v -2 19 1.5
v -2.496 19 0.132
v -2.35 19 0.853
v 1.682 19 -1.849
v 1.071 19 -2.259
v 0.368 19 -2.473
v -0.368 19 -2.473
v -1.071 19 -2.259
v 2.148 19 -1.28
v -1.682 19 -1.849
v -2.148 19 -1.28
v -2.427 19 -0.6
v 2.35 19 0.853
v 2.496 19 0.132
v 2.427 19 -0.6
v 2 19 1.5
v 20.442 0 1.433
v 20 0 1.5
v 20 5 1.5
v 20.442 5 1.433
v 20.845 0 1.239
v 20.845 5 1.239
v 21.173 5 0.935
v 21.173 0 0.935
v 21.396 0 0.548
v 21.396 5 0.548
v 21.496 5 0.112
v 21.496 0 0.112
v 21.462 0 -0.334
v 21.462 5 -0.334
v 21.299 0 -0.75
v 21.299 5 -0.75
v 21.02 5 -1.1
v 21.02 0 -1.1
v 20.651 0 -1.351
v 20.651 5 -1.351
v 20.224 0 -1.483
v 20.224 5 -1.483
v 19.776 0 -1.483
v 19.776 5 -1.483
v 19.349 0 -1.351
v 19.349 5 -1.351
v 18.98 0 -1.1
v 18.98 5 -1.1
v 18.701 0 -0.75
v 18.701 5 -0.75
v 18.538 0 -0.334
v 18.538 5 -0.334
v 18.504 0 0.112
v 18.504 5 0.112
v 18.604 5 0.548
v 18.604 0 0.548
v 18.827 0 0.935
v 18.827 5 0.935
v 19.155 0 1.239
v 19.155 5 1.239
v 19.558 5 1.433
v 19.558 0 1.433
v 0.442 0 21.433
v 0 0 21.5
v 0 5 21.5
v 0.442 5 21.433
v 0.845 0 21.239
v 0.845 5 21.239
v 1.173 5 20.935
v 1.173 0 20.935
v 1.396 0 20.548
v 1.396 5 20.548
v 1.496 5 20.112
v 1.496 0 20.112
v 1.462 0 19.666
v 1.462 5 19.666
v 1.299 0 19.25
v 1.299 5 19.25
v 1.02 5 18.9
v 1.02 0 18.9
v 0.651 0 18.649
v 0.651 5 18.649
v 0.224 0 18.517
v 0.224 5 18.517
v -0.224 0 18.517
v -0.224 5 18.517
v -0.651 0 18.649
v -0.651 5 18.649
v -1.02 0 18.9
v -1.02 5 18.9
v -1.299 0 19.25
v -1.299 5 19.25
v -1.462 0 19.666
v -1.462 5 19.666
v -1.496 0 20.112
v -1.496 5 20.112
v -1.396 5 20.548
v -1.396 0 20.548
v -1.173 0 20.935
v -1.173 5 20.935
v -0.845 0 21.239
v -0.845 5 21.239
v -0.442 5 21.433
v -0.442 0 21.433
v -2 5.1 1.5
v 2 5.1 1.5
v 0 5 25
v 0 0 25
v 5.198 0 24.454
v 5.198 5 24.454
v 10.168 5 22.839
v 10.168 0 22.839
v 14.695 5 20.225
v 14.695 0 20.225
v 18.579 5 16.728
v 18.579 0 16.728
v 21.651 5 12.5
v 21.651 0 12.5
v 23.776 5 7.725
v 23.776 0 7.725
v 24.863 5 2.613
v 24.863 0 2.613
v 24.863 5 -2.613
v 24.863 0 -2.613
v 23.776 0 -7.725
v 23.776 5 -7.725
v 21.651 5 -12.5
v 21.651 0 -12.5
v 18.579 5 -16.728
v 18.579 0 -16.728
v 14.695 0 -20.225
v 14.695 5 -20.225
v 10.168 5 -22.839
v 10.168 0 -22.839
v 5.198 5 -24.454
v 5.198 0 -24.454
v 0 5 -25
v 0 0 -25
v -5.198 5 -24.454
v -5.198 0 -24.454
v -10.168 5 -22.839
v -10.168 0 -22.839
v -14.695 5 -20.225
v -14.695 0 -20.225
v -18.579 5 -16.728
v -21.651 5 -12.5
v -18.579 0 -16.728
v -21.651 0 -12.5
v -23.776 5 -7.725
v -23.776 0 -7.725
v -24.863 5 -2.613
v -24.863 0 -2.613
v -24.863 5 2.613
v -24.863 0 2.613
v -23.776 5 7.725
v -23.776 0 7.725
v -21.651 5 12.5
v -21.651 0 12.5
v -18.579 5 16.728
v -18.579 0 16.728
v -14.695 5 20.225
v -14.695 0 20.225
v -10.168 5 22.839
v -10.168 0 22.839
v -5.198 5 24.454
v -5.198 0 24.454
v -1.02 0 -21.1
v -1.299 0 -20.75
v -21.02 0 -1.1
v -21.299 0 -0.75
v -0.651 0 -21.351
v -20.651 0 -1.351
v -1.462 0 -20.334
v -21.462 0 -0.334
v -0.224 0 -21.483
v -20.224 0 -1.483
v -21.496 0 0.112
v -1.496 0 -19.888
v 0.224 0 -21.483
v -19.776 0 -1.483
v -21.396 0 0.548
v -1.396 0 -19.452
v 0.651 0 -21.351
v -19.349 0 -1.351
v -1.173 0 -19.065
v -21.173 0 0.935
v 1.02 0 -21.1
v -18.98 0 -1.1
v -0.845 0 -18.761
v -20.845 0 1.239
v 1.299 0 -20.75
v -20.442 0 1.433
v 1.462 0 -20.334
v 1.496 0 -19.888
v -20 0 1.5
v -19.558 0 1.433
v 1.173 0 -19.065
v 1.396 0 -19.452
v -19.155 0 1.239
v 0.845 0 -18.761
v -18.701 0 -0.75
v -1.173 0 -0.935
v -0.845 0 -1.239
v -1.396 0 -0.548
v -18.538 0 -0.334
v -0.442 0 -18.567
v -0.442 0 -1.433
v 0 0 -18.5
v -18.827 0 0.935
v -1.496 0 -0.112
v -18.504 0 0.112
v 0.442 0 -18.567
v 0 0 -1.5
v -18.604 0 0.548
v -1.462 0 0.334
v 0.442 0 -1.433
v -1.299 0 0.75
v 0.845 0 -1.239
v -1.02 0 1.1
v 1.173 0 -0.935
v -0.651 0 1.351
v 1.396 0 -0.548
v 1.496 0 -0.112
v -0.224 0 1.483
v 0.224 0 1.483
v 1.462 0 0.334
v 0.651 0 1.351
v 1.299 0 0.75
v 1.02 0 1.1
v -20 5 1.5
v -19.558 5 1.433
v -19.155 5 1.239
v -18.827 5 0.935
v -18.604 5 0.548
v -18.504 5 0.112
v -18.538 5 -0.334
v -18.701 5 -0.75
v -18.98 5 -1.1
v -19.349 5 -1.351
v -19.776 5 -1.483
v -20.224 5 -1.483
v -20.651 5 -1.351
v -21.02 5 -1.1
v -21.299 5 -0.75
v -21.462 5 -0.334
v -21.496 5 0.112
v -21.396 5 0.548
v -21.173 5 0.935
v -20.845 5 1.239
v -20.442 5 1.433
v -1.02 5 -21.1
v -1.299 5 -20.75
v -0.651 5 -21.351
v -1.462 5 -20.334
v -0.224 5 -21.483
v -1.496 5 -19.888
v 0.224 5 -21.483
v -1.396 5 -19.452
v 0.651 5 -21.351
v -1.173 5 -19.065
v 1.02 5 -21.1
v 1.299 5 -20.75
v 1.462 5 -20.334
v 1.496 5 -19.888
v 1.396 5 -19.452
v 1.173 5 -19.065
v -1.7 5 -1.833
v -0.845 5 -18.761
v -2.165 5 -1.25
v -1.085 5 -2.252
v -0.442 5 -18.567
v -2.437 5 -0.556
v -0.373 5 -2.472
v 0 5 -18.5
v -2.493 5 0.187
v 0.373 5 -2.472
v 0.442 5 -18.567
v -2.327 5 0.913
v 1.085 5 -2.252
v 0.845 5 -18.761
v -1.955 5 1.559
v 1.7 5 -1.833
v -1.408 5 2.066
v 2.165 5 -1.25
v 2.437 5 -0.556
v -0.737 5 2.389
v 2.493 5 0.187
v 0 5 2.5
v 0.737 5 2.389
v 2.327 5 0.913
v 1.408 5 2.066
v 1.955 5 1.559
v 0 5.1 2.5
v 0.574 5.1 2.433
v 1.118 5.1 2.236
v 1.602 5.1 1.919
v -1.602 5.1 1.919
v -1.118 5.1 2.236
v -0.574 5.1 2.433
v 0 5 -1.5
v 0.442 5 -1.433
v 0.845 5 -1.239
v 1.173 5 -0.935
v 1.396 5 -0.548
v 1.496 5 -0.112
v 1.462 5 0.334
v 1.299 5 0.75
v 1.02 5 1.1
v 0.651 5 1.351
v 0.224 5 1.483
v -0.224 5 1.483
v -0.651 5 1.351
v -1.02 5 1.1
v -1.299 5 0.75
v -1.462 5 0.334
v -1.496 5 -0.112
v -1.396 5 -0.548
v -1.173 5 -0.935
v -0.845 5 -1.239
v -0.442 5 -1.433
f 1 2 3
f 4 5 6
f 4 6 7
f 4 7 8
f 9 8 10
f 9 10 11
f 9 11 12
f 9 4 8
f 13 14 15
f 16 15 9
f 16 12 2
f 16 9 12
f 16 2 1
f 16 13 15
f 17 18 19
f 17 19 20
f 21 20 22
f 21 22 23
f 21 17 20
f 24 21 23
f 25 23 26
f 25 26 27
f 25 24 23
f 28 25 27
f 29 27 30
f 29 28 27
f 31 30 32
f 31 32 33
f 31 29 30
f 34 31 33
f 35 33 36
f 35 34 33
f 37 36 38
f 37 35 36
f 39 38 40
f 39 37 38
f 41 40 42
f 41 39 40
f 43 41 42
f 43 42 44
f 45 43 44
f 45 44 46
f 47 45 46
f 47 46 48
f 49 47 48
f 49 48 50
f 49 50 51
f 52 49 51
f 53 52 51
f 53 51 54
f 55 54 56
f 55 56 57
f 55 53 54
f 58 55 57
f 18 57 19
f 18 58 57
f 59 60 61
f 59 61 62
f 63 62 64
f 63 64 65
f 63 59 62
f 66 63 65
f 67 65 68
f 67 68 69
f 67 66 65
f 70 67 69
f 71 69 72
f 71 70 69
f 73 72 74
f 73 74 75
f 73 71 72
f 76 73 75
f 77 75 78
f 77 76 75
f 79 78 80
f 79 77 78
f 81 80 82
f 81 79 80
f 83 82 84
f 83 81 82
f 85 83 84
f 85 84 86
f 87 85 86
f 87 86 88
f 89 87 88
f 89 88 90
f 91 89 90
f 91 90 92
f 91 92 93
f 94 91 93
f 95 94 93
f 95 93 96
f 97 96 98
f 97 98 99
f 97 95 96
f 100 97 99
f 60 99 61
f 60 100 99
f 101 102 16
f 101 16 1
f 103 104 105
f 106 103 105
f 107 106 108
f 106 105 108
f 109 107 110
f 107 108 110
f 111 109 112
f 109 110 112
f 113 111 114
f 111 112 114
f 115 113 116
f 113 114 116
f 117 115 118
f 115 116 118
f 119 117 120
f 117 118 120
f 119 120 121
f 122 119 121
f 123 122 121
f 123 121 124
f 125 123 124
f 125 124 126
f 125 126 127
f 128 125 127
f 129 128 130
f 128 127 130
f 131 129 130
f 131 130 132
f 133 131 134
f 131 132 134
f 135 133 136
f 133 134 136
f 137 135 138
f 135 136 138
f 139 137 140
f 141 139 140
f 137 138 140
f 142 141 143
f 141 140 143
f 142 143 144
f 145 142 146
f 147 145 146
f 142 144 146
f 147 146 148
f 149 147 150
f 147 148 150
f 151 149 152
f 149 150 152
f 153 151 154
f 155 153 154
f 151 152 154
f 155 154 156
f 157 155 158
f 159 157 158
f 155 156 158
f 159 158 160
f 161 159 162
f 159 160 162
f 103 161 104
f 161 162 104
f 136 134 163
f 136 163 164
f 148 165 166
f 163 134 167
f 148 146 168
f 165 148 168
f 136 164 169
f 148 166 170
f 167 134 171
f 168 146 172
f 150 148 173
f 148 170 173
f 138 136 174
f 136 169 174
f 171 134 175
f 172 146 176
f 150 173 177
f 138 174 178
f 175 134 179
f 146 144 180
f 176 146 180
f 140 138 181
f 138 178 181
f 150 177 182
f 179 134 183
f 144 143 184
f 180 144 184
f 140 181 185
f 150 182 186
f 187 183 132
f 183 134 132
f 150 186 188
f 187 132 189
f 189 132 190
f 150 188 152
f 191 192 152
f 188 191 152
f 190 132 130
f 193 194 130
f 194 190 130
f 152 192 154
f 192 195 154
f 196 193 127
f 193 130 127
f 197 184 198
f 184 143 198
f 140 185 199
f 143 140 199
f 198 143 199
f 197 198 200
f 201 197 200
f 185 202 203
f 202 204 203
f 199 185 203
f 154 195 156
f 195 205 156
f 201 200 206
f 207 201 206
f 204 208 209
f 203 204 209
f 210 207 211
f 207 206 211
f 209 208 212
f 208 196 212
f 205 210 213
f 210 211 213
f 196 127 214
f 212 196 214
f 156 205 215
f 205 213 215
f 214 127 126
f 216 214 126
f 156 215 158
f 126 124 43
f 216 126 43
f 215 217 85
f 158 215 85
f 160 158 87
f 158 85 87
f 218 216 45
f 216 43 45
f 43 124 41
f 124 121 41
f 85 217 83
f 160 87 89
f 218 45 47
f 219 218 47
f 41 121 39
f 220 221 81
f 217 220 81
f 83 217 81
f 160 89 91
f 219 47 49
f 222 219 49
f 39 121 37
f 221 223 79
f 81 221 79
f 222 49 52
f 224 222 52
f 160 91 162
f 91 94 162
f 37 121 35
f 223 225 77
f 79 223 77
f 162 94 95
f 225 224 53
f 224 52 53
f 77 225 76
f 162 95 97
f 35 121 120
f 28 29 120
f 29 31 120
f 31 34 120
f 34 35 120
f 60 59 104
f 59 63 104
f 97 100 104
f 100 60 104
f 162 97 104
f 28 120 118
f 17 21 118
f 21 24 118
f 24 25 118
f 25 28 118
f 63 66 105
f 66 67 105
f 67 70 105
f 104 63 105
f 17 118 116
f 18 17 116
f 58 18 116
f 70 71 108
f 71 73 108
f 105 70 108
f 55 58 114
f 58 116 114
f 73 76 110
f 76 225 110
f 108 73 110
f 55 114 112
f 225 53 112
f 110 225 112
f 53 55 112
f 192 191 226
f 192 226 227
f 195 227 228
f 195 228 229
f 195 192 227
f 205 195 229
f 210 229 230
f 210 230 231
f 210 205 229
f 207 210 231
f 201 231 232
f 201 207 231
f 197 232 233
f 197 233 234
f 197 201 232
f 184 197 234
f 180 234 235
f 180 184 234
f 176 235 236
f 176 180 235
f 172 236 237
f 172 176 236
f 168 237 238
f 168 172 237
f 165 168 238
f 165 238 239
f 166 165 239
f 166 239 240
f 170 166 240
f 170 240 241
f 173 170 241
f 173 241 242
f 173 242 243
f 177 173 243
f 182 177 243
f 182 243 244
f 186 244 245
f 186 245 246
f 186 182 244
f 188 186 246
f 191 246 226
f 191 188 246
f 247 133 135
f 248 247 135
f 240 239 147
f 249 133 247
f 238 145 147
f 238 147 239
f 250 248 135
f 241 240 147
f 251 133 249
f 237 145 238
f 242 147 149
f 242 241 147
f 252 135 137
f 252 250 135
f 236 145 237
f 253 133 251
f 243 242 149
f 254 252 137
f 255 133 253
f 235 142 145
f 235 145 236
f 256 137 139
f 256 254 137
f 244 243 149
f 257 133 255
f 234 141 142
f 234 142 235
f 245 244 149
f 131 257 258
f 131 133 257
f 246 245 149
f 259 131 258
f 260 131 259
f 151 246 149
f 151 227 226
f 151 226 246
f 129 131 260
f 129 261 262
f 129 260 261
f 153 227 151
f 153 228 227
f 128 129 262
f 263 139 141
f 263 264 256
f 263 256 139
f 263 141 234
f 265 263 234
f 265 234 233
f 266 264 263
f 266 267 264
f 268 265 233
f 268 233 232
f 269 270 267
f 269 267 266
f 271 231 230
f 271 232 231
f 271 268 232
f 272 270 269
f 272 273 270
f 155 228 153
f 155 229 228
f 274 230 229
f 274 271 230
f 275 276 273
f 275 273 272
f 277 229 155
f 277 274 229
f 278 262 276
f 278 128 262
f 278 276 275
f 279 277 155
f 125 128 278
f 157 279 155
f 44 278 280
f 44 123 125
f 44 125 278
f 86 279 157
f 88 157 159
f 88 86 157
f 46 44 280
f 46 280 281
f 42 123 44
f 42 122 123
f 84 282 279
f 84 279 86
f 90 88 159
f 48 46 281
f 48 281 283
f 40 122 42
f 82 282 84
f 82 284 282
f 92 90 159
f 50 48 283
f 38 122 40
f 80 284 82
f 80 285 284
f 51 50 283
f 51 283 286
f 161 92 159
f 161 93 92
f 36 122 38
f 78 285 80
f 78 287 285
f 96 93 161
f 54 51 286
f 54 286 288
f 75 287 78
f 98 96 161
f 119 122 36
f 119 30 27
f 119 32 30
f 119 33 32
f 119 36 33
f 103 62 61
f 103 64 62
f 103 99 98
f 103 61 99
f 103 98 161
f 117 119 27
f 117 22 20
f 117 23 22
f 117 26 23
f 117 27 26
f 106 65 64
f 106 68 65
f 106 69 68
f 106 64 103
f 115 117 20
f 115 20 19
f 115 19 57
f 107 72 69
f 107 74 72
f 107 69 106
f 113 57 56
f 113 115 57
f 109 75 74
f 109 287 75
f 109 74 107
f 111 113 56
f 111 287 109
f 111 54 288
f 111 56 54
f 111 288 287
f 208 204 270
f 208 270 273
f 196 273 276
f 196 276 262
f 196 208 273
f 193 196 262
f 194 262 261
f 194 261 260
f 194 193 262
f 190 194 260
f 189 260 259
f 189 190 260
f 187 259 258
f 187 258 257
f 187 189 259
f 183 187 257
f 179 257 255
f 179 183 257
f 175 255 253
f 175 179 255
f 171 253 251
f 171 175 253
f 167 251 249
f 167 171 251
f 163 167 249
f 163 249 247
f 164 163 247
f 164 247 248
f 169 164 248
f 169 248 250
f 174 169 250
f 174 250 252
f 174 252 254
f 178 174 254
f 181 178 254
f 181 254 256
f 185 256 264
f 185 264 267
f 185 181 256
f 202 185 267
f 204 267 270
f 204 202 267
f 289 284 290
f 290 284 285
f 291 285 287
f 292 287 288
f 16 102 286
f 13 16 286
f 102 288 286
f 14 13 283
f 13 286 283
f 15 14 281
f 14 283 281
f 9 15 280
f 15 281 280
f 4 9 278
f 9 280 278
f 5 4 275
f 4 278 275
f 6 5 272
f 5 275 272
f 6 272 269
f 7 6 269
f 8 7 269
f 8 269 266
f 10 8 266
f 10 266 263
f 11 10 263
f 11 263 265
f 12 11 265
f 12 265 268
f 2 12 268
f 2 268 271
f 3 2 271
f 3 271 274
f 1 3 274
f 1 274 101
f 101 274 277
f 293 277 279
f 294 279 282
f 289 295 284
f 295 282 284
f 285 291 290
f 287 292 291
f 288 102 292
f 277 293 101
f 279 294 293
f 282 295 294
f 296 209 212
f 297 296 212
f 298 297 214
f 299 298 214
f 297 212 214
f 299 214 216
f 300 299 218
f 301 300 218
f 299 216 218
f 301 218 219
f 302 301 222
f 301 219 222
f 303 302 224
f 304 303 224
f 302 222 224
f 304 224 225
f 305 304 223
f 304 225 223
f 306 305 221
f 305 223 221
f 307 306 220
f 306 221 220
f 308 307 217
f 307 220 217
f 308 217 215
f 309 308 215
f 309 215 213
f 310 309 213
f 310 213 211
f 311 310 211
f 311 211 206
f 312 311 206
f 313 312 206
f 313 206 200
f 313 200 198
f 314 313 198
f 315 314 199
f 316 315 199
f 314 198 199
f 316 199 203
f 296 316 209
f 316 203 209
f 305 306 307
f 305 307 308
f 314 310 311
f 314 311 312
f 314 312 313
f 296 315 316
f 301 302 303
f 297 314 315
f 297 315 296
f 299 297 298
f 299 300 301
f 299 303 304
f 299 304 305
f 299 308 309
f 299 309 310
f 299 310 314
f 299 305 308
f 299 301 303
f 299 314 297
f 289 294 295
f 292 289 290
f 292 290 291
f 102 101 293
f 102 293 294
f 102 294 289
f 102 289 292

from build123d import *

# Parameters (mm, degrees)
SKETCH1_R           = 25
SKETCH1_R_2         = 1.5
BOSS_EXTRUDE1_DEPTH = 5
SKETCH2_R           = 2.5
BOSS_EXTRUDE2_DEPTH = 14
SKETCH3_R           = 1.5
CUT_EXTRUDE1_DEPTH  = 5
CUT_EXTRUDE3_START  = -13.9
CUT_EXTRUDE3_DEPTH  = 13.9


with BuildPart() as part:
    # Sketch1 → Boss-Extrude1 (new body)
    with BuildSketch(Plane(origin=(0, 0, 0), x_dir=(1, 0, 0), z_dir=(0, 1, 0))):
        with Locations(Location((0, 0, 0), (0, 0, 270))):
            Circle(SKETCH1_R)
        with Locations(Location((0, -20, 0), (0, 0, 270))):
            Circle(SKETCH1_R_2, mode=Mode.SUBTRACT)
        with Locations(Location((-20, 0, 0), (0, 0, 270))):
            Circle(SKETCH1_R_2, mode=Mode.SUBTRACT)
        with Locations(Location((0, 20, 0), (0, 0, 270))):
            Circle(SKETCH1_R_2, mode=Mode.SUBTRACT)
        with Locations(Location((20, 0, 0), (0, 0, 270))):
            Circle(SKETCH1_R_2, mode=Mode.SUBTRACT)
    extrude(amount=BOSS_EXTRUDE1_DEPTH)

    # Sketch2 → Boss-Extrude2 (add)
    with BuildSketch(Plane(origin=(0, 5, 0), x_dir=(1, 0, 0), z_dir=(0, 1, 0))):
        with Locations(Location((0, 0, 0), (0, 0, 270))):
            Circle(SKETCH2_R)
    extrude(amount=BOSS_EXTRUDE2_DEPTH)

    # Sketch3 → Cut-Extrude1 (cut)
    with BuildSketch(Plane.XZ):
        with Locations(Location((0, 0, 0), (0, 0, 270))):
            Circle(SKETCH3_R)
    extrude(amount=-CUT_EXTRUDE1_DEPTH, mode=Mode.SUBTRACT)

    # Sketch4 → Cut-Extrude3 (cut)
    with BuildSketch(Plane(origin=(0, 19, 0), x_dir=(1, 0, 0), z_dir=(0, 1, 0)).offset(CUT_EXTRUDE3_START)):
        with BuildLine():
            Line((2, -1.5), (-2, -1.5))
            ThreePointArc((-2, -1.5), (0, -2.5), (2, -1.5))
        make_face()
    extrude(amount=CUT_EXTRUDE3_DEPTH, mode=Mode.SUBTRACT)


solid = part.part
